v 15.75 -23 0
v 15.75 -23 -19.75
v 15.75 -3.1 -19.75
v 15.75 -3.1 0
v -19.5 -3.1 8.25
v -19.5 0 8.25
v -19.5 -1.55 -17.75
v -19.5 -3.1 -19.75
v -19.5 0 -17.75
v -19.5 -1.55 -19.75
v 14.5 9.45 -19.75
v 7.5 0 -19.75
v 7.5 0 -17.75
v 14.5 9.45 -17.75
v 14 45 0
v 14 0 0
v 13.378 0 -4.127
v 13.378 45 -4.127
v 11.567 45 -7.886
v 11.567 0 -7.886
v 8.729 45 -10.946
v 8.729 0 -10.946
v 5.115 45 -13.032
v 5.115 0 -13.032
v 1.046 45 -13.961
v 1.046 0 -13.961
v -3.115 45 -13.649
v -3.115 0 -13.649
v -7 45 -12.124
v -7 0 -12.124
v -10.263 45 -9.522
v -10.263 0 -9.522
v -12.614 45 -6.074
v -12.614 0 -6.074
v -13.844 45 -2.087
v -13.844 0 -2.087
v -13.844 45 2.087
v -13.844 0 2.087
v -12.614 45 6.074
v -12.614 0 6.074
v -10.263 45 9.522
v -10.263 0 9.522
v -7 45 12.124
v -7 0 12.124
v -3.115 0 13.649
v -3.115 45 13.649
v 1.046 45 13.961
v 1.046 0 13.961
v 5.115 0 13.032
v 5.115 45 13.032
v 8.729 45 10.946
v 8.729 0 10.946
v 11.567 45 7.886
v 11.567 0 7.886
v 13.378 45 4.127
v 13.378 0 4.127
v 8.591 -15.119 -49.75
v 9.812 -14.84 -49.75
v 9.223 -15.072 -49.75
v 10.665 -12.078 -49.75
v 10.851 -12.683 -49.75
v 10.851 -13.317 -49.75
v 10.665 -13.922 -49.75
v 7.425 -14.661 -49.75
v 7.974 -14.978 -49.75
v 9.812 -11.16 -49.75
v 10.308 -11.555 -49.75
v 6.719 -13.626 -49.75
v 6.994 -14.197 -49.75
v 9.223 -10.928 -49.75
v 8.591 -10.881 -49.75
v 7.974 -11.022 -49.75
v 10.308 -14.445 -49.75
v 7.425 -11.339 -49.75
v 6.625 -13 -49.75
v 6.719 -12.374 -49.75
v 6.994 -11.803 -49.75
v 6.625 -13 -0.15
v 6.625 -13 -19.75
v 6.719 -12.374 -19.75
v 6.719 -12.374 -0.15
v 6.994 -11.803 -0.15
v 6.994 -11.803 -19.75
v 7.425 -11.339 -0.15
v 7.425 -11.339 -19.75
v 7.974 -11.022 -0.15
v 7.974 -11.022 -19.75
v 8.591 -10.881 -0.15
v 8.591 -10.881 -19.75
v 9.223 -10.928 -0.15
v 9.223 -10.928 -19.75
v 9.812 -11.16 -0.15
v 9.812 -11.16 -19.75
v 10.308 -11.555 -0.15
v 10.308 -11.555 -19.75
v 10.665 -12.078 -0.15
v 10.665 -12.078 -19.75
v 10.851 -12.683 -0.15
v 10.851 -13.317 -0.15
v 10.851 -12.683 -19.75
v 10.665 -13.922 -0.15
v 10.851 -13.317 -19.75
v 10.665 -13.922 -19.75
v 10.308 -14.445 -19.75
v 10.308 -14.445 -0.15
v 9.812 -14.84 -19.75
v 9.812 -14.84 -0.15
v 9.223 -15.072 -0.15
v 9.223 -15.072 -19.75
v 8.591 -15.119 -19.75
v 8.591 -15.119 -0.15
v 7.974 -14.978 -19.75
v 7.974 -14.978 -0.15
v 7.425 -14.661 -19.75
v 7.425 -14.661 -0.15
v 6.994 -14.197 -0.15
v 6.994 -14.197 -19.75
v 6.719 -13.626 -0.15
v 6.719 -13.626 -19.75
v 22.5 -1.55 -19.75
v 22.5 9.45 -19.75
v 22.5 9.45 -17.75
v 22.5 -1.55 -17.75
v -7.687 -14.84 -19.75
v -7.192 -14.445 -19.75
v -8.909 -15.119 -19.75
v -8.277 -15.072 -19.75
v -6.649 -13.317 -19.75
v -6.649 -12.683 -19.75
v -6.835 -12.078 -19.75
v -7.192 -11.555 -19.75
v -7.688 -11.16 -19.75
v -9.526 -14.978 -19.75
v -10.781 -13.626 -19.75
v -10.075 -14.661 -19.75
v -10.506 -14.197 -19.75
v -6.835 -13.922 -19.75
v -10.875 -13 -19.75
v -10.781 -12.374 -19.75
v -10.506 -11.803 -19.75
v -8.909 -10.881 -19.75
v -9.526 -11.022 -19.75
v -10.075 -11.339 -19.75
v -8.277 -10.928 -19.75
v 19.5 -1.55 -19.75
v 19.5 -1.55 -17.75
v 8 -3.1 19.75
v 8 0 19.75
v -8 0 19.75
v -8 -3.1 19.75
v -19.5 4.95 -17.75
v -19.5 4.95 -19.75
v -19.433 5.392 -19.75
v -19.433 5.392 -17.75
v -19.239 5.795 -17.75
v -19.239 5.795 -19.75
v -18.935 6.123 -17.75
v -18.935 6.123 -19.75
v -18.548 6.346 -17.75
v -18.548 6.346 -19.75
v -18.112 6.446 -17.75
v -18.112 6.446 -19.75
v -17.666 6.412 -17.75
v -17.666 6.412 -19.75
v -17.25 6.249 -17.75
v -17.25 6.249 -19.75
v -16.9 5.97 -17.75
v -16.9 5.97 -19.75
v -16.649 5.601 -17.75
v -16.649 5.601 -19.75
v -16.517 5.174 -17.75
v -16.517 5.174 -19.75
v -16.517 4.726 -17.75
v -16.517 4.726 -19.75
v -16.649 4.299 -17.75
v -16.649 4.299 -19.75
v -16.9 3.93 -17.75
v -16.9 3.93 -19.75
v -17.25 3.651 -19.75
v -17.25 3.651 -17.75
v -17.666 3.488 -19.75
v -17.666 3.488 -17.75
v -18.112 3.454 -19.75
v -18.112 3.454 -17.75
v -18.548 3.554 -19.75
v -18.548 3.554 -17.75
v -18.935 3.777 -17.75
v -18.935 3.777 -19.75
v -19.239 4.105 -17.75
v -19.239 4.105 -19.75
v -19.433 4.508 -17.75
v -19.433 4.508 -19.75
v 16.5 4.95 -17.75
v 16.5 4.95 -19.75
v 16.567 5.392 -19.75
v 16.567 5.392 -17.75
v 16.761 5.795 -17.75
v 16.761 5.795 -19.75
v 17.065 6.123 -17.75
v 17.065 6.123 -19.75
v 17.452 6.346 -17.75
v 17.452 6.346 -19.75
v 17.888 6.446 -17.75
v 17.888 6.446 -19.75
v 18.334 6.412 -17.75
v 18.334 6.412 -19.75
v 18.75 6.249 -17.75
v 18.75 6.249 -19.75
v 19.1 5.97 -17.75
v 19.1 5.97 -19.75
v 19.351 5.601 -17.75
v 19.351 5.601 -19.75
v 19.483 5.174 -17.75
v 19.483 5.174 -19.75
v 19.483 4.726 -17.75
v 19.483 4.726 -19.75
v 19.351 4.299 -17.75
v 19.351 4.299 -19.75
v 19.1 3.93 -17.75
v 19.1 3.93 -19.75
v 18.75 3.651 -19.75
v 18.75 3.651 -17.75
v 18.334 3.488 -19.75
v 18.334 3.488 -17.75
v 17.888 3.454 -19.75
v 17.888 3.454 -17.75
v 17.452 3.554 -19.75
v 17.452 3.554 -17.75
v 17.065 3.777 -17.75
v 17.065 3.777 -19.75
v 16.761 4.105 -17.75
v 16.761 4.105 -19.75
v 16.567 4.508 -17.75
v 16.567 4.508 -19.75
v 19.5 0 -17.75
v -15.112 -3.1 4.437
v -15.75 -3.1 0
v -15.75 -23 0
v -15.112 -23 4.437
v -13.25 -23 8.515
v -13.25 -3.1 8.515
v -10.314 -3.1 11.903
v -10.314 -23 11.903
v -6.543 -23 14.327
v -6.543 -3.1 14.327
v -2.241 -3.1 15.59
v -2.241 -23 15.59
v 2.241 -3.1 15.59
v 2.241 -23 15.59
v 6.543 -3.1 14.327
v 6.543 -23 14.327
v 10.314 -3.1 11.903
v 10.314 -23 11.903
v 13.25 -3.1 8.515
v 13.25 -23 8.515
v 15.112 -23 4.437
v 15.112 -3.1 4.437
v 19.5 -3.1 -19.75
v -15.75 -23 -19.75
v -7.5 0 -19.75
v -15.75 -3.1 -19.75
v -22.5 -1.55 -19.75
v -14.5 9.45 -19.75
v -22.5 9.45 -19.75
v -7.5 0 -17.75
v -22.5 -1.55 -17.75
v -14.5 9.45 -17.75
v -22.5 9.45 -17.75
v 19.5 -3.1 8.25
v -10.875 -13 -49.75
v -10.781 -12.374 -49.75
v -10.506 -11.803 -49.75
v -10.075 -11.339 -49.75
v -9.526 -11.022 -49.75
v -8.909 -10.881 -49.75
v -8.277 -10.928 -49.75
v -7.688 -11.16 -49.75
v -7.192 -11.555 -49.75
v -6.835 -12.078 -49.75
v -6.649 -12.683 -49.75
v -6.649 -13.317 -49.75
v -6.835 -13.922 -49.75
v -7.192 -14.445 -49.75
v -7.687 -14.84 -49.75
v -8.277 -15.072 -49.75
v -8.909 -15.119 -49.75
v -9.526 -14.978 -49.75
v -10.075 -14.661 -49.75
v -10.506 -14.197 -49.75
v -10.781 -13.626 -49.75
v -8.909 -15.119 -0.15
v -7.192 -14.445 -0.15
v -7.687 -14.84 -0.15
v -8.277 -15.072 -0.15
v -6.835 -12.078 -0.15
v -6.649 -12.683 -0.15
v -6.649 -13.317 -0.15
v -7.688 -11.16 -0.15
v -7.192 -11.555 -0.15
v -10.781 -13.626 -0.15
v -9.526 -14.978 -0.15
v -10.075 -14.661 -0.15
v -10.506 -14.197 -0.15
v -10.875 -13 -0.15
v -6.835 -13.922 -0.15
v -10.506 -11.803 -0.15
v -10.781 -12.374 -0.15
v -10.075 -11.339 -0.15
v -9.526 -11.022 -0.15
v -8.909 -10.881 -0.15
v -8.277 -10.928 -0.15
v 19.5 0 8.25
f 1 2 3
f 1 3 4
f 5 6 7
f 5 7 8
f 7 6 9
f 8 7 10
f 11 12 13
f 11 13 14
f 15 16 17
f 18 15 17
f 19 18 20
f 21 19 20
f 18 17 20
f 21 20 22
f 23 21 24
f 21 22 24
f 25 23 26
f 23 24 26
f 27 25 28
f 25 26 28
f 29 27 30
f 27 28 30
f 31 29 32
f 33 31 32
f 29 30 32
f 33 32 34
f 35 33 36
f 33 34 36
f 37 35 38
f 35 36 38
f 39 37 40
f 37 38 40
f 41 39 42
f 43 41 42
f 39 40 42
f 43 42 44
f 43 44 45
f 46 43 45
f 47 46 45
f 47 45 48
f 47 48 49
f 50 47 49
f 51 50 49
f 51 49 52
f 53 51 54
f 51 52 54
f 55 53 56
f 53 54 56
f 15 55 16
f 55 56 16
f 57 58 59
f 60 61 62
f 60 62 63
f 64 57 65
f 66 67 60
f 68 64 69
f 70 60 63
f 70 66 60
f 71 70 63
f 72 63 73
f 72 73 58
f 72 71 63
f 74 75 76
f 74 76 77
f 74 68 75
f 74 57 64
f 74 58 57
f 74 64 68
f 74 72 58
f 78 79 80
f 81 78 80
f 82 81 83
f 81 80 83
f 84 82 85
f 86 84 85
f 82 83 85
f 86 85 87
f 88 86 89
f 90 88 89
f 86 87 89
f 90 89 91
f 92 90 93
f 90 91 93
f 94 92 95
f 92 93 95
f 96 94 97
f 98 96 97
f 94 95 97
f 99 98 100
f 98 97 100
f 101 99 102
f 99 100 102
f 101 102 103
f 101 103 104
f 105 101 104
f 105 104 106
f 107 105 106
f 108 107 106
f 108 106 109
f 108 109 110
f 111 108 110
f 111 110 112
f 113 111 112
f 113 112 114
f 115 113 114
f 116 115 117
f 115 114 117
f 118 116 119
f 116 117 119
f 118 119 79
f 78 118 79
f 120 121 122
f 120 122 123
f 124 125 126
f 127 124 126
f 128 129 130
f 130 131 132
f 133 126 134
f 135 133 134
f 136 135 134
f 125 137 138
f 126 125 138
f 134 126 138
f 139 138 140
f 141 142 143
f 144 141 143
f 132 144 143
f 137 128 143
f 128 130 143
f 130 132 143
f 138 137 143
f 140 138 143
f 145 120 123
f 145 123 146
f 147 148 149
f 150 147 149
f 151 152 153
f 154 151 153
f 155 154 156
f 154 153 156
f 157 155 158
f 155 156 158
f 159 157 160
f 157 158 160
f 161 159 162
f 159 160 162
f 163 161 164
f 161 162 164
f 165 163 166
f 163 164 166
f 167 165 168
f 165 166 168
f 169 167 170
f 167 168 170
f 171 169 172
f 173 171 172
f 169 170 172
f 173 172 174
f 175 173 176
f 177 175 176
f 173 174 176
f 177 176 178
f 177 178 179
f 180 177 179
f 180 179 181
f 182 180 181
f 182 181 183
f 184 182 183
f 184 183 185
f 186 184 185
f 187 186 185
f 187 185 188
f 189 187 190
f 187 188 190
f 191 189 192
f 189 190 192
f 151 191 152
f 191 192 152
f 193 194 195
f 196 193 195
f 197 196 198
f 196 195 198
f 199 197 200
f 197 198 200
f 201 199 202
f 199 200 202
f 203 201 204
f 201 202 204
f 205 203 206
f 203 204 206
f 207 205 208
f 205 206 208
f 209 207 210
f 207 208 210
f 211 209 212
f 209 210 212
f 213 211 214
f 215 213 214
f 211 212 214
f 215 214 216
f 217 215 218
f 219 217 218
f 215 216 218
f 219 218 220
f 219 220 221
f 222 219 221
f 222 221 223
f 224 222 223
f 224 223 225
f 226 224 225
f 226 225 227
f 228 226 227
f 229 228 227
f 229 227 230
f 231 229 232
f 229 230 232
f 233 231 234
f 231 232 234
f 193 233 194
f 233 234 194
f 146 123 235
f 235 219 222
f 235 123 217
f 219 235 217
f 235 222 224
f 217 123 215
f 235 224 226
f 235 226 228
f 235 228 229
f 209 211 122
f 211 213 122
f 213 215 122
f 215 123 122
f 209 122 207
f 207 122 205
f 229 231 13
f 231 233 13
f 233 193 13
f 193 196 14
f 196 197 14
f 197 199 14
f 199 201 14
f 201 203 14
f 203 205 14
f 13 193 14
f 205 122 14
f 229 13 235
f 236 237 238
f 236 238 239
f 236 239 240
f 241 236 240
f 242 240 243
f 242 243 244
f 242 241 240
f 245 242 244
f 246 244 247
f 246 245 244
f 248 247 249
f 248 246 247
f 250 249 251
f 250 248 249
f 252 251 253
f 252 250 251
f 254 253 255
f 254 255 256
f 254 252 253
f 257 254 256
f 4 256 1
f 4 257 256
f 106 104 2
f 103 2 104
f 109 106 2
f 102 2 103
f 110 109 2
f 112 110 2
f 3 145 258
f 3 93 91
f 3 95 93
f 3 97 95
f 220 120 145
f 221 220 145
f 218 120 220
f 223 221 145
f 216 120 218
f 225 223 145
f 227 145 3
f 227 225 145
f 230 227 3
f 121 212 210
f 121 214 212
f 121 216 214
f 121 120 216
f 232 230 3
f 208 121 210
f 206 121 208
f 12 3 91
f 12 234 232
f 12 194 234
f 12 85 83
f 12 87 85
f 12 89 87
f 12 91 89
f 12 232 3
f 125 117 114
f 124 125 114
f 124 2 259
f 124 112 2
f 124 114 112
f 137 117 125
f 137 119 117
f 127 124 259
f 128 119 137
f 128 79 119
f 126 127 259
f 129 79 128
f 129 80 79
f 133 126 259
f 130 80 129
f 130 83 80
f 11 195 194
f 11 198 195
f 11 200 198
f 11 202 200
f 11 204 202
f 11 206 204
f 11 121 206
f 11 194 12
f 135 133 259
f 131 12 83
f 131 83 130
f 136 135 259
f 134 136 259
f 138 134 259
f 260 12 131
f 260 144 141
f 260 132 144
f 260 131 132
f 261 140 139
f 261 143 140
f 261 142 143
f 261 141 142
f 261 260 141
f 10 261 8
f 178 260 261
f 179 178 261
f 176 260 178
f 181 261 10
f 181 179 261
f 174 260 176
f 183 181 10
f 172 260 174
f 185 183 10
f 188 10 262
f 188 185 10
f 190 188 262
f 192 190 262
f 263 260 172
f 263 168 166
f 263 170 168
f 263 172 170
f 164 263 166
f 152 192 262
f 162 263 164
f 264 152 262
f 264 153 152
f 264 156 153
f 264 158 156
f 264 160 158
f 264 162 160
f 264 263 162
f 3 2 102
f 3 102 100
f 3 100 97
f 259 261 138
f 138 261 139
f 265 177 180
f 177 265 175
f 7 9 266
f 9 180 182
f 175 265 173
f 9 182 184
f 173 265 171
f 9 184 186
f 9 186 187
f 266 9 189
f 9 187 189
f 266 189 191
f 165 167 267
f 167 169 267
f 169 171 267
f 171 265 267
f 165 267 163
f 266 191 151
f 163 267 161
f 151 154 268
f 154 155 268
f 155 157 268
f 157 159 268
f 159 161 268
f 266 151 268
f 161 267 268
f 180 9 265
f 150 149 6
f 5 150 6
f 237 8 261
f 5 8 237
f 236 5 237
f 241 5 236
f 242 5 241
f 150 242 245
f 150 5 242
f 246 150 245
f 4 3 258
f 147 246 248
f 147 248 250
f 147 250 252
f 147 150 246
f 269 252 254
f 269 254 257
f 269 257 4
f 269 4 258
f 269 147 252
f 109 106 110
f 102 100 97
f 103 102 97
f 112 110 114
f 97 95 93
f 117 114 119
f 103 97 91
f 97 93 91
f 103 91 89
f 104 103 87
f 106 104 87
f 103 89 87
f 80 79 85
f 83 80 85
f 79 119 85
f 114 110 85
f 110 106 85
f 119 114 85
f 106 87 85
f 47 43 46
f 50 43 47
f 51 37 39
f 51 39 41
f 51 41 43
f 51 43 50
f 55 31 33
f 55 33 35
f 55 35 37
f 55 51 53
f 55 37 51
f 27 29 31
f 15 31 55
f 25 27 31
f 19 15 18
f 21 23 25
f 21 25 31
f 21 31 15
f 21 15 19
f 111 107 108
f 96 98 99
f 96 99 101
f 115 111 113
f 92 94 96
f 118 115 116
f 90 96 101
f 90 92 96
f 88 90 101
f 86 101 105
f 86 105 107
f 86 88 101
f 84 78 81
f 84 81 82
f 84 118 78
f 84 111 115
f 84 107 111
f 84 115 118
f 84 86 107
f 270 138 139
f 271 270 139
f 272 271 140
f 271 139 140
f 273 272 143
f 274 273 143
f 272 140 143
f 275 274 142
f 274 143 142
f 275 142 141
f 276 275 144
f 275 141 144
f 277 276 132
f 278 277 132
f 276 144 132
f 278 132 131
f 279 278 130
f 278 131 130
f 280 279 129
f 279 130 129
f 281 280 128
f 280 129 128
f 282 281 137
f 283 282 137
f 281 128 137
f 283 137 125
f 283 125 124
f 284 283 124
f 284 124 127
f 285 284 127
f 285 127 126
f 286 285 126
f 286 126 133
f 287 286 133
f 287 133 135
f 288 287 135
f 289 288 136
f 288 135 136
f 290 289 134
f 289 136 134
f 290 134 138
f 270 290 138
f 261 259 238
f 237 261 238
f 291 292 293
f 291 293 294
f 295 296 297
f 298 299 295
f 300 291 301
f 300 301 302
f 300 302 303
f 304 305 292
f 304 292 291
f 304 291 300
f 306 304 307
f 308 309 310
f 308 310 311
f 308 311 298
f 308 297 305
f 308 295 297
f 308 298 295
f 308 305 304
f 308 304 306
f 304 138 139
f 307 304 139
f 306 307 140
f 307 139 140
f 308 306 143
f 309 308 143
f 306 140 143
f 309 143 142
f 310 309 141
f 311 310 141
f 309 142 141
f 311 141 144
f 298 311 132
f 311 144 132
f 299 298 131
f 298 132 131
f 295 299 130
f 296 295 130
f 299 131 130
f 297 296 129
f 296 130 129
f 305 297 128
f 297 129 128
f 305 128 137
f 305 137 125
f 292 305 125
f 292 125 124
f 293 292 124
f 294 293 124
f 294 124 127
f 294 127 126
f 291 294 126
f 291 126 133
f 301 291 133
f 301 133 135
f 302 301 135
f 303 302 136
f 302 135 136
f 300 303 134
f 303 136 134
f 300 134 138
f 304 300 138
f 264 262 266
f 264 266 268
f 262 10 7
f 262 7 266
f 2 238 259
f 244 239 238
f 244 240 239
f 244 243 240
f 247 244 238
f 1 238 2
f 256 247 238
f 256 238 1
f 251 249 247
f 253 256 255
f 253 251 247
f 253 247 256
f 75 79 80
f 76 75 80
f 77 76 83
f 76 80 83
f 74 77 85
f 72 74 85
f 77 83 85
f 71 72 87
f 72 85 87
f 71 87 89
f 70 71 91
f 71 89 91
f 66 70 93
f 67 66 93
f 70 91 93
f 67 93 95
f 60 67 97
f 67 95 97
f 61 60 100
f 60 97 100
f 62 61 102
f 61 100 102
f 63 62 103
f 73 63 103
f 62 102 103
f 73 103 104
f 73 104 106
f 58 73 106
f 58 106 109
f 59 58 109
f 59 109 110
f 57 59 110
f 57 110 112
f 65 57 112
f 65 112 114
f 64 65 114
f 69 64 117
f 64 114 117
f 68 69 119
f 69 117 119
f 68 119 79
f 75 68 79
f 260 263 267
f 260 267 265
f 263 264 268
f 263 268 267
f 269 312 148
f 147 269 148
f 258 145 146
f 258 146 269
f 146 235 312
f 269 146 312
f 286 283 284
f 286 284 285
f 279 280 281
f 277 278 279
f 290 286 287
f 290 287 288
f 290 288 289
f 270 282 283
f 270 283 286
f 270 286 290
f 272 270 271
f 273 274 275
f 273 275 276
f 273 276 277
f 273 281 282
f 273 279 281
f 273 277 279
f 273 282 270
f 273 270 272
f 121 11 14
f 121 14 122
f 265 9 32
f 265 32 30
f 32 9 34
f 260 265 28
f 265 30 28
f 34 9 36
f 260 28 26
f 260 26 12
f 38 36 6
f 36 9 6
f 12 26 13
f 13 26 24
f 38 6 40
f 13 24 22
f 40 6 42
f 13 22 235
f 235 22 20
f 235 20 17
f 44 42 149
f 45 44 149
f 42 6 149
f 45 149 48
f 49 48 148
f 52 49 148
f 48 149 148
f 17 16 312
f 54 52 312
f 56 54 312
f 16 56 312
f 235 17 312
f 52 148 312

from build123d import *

# Parameters (mm, degrees)
SKETCH1_R             = 14
BOSS_EXTRUDE1_DEPTH   = 45
BOSS_EXTRUDE3_DEPTH   = 3.1
SKETCH4_R             = 15.75
BOSS_EXTRUDE4_DEPTH   = 23
SKETCH5_W             = 31.5
SKETCH5_H             = 19.75
BOSS_EXTRUDE5_DEPTH   = 19.9
SKETCH6_R             = 2.125
CUT_EXTRUDE1_DEPTH    = 19.6
SKETCH7_R             = 1.5
BOSS_EXTRUDE6_DEPTH   = 2
SKETCH6_2_R           = 2.125
BOSS_EXTRUDE7_DEPTH   = 30
BOSS_EXTRUDE7_2_DEPTH = 30


with BuildPart() as part:
    # Sketch1 → Boss-Extrude1 (new body)
    with BuildSketch(Plane(origin=(0, 0, 0), x_dir=(1, 0, 0), z_dir=(0, 1, 0))):
        Circle(SKETCH1_R)
    extrude(amount=BOSS_EXTRUDE1_DEPTH)

    # Sketch3 → Boss-Extrude3 (add)
    with BuildSketch(Plane.XZ):
        Polygon((-8, 19.75), (-19.5, 8.25), (-19.5, -19.75), (19.5, -19.75), (19.5, 8.25), (8, 19.75), align=None)
    extrude(amount=BOSS_EXTRUDE3_DEPTH)

    # Sketch4 → Boss-Extrude4 (add)
    with BuildSketch(Plane(origin=(0, 0, 0), x_dir=(1, 0, 0), z_dir=(0, 1, 0))):
        Circle(SKETCH4_R)
    extrude(amount=-BOSS_EXTRUDE4_DEPTH)

    # Sketch5 → Boss-Extrude5 (add)
    with BuildSketch(Plane.XZ.offset(3.1)):
        with Locations((0, -9.875)):
            Rectangle(SKETCH5_W, SKETCH5_H)
    extrude(amount=BOSS_EXTRUDE5_DEPTH)

    # Sketch6 → Cut-Extrude1 (cut)
    with BuildSketch(Plane(origin=(0, 0, -19.75), x_dir=(-1, 0, 0), z_dir=(0, 0, -1))):
        with Locations((-8.75, -13)):
            Circle(SKETCH6_R)
        with Locations((8.75, -13)):
            Circle(SKETCH6_R)
    extrude(amount=-CUT_EXTRUDE1_DEPTH, mode=Mode.SUBTRACT)

    # Sketch7 → Boss-Extrude6 (add)
    with BuildSketch(Plane(origin=(0, 0, -19.75), x_dir=(-1, 0, 0), z_dir=(0, 0, -1))):
        Polygon((-22.5, -1.55), (-19.5, -1.55), (-19.5, 0), (-7.5, 0), (-14.5, 9.45), (-18, 9.45), (-22.5, 9.45), align=None)
        with Locations((-18, 4.95)):
            Circle(SKETCH7_R, mode=Mode.SUBTRACT)
        Polygon((14.5, 9.45), (7.5, 0), (19.5, 0), (19.5, -1.55), (22.5, -1.55), (22.5, 9.45), (18, 9.45), align=None)
        with Locations((18, 4.95)):
            Circle(SKETCH7_R, mode=Mode.SUBTRACT)
    extrude(amount=-BOSS_EXTRUDE6_DEPTH)


with BuildPart() as body_2:
    # Sketch6<2> → Boss-Extrude7 (new body)
    with BuildSketch(Plane(origin=(0, 0, -19.75), x_dir=(-1, 0, 0), z_dir=(0, 0, -1))):
        with Locations((-8.75, -13)):
            Circle(SKETCH6_2_R)
    extrude(amount=BOSS_EXTRUDE7_DEPTH)


with BuildPart() as body_3:
    # Sketch6<2> → Boss-Extrude7 2 (new body)
    with BuildSketch(Plane(origin=(0, 0, -19.75), x_dir=(-1, 0, 0), z_dir=(0, 0, -1))):
        with Locations((8.75, -13)):
            Circle(SKETCH6_2_R)
    extrude(amount=BOSS_EXTRUDE7_2_DEPTH)


solid = Compound([part.part, body_2.part, body_3.part])
